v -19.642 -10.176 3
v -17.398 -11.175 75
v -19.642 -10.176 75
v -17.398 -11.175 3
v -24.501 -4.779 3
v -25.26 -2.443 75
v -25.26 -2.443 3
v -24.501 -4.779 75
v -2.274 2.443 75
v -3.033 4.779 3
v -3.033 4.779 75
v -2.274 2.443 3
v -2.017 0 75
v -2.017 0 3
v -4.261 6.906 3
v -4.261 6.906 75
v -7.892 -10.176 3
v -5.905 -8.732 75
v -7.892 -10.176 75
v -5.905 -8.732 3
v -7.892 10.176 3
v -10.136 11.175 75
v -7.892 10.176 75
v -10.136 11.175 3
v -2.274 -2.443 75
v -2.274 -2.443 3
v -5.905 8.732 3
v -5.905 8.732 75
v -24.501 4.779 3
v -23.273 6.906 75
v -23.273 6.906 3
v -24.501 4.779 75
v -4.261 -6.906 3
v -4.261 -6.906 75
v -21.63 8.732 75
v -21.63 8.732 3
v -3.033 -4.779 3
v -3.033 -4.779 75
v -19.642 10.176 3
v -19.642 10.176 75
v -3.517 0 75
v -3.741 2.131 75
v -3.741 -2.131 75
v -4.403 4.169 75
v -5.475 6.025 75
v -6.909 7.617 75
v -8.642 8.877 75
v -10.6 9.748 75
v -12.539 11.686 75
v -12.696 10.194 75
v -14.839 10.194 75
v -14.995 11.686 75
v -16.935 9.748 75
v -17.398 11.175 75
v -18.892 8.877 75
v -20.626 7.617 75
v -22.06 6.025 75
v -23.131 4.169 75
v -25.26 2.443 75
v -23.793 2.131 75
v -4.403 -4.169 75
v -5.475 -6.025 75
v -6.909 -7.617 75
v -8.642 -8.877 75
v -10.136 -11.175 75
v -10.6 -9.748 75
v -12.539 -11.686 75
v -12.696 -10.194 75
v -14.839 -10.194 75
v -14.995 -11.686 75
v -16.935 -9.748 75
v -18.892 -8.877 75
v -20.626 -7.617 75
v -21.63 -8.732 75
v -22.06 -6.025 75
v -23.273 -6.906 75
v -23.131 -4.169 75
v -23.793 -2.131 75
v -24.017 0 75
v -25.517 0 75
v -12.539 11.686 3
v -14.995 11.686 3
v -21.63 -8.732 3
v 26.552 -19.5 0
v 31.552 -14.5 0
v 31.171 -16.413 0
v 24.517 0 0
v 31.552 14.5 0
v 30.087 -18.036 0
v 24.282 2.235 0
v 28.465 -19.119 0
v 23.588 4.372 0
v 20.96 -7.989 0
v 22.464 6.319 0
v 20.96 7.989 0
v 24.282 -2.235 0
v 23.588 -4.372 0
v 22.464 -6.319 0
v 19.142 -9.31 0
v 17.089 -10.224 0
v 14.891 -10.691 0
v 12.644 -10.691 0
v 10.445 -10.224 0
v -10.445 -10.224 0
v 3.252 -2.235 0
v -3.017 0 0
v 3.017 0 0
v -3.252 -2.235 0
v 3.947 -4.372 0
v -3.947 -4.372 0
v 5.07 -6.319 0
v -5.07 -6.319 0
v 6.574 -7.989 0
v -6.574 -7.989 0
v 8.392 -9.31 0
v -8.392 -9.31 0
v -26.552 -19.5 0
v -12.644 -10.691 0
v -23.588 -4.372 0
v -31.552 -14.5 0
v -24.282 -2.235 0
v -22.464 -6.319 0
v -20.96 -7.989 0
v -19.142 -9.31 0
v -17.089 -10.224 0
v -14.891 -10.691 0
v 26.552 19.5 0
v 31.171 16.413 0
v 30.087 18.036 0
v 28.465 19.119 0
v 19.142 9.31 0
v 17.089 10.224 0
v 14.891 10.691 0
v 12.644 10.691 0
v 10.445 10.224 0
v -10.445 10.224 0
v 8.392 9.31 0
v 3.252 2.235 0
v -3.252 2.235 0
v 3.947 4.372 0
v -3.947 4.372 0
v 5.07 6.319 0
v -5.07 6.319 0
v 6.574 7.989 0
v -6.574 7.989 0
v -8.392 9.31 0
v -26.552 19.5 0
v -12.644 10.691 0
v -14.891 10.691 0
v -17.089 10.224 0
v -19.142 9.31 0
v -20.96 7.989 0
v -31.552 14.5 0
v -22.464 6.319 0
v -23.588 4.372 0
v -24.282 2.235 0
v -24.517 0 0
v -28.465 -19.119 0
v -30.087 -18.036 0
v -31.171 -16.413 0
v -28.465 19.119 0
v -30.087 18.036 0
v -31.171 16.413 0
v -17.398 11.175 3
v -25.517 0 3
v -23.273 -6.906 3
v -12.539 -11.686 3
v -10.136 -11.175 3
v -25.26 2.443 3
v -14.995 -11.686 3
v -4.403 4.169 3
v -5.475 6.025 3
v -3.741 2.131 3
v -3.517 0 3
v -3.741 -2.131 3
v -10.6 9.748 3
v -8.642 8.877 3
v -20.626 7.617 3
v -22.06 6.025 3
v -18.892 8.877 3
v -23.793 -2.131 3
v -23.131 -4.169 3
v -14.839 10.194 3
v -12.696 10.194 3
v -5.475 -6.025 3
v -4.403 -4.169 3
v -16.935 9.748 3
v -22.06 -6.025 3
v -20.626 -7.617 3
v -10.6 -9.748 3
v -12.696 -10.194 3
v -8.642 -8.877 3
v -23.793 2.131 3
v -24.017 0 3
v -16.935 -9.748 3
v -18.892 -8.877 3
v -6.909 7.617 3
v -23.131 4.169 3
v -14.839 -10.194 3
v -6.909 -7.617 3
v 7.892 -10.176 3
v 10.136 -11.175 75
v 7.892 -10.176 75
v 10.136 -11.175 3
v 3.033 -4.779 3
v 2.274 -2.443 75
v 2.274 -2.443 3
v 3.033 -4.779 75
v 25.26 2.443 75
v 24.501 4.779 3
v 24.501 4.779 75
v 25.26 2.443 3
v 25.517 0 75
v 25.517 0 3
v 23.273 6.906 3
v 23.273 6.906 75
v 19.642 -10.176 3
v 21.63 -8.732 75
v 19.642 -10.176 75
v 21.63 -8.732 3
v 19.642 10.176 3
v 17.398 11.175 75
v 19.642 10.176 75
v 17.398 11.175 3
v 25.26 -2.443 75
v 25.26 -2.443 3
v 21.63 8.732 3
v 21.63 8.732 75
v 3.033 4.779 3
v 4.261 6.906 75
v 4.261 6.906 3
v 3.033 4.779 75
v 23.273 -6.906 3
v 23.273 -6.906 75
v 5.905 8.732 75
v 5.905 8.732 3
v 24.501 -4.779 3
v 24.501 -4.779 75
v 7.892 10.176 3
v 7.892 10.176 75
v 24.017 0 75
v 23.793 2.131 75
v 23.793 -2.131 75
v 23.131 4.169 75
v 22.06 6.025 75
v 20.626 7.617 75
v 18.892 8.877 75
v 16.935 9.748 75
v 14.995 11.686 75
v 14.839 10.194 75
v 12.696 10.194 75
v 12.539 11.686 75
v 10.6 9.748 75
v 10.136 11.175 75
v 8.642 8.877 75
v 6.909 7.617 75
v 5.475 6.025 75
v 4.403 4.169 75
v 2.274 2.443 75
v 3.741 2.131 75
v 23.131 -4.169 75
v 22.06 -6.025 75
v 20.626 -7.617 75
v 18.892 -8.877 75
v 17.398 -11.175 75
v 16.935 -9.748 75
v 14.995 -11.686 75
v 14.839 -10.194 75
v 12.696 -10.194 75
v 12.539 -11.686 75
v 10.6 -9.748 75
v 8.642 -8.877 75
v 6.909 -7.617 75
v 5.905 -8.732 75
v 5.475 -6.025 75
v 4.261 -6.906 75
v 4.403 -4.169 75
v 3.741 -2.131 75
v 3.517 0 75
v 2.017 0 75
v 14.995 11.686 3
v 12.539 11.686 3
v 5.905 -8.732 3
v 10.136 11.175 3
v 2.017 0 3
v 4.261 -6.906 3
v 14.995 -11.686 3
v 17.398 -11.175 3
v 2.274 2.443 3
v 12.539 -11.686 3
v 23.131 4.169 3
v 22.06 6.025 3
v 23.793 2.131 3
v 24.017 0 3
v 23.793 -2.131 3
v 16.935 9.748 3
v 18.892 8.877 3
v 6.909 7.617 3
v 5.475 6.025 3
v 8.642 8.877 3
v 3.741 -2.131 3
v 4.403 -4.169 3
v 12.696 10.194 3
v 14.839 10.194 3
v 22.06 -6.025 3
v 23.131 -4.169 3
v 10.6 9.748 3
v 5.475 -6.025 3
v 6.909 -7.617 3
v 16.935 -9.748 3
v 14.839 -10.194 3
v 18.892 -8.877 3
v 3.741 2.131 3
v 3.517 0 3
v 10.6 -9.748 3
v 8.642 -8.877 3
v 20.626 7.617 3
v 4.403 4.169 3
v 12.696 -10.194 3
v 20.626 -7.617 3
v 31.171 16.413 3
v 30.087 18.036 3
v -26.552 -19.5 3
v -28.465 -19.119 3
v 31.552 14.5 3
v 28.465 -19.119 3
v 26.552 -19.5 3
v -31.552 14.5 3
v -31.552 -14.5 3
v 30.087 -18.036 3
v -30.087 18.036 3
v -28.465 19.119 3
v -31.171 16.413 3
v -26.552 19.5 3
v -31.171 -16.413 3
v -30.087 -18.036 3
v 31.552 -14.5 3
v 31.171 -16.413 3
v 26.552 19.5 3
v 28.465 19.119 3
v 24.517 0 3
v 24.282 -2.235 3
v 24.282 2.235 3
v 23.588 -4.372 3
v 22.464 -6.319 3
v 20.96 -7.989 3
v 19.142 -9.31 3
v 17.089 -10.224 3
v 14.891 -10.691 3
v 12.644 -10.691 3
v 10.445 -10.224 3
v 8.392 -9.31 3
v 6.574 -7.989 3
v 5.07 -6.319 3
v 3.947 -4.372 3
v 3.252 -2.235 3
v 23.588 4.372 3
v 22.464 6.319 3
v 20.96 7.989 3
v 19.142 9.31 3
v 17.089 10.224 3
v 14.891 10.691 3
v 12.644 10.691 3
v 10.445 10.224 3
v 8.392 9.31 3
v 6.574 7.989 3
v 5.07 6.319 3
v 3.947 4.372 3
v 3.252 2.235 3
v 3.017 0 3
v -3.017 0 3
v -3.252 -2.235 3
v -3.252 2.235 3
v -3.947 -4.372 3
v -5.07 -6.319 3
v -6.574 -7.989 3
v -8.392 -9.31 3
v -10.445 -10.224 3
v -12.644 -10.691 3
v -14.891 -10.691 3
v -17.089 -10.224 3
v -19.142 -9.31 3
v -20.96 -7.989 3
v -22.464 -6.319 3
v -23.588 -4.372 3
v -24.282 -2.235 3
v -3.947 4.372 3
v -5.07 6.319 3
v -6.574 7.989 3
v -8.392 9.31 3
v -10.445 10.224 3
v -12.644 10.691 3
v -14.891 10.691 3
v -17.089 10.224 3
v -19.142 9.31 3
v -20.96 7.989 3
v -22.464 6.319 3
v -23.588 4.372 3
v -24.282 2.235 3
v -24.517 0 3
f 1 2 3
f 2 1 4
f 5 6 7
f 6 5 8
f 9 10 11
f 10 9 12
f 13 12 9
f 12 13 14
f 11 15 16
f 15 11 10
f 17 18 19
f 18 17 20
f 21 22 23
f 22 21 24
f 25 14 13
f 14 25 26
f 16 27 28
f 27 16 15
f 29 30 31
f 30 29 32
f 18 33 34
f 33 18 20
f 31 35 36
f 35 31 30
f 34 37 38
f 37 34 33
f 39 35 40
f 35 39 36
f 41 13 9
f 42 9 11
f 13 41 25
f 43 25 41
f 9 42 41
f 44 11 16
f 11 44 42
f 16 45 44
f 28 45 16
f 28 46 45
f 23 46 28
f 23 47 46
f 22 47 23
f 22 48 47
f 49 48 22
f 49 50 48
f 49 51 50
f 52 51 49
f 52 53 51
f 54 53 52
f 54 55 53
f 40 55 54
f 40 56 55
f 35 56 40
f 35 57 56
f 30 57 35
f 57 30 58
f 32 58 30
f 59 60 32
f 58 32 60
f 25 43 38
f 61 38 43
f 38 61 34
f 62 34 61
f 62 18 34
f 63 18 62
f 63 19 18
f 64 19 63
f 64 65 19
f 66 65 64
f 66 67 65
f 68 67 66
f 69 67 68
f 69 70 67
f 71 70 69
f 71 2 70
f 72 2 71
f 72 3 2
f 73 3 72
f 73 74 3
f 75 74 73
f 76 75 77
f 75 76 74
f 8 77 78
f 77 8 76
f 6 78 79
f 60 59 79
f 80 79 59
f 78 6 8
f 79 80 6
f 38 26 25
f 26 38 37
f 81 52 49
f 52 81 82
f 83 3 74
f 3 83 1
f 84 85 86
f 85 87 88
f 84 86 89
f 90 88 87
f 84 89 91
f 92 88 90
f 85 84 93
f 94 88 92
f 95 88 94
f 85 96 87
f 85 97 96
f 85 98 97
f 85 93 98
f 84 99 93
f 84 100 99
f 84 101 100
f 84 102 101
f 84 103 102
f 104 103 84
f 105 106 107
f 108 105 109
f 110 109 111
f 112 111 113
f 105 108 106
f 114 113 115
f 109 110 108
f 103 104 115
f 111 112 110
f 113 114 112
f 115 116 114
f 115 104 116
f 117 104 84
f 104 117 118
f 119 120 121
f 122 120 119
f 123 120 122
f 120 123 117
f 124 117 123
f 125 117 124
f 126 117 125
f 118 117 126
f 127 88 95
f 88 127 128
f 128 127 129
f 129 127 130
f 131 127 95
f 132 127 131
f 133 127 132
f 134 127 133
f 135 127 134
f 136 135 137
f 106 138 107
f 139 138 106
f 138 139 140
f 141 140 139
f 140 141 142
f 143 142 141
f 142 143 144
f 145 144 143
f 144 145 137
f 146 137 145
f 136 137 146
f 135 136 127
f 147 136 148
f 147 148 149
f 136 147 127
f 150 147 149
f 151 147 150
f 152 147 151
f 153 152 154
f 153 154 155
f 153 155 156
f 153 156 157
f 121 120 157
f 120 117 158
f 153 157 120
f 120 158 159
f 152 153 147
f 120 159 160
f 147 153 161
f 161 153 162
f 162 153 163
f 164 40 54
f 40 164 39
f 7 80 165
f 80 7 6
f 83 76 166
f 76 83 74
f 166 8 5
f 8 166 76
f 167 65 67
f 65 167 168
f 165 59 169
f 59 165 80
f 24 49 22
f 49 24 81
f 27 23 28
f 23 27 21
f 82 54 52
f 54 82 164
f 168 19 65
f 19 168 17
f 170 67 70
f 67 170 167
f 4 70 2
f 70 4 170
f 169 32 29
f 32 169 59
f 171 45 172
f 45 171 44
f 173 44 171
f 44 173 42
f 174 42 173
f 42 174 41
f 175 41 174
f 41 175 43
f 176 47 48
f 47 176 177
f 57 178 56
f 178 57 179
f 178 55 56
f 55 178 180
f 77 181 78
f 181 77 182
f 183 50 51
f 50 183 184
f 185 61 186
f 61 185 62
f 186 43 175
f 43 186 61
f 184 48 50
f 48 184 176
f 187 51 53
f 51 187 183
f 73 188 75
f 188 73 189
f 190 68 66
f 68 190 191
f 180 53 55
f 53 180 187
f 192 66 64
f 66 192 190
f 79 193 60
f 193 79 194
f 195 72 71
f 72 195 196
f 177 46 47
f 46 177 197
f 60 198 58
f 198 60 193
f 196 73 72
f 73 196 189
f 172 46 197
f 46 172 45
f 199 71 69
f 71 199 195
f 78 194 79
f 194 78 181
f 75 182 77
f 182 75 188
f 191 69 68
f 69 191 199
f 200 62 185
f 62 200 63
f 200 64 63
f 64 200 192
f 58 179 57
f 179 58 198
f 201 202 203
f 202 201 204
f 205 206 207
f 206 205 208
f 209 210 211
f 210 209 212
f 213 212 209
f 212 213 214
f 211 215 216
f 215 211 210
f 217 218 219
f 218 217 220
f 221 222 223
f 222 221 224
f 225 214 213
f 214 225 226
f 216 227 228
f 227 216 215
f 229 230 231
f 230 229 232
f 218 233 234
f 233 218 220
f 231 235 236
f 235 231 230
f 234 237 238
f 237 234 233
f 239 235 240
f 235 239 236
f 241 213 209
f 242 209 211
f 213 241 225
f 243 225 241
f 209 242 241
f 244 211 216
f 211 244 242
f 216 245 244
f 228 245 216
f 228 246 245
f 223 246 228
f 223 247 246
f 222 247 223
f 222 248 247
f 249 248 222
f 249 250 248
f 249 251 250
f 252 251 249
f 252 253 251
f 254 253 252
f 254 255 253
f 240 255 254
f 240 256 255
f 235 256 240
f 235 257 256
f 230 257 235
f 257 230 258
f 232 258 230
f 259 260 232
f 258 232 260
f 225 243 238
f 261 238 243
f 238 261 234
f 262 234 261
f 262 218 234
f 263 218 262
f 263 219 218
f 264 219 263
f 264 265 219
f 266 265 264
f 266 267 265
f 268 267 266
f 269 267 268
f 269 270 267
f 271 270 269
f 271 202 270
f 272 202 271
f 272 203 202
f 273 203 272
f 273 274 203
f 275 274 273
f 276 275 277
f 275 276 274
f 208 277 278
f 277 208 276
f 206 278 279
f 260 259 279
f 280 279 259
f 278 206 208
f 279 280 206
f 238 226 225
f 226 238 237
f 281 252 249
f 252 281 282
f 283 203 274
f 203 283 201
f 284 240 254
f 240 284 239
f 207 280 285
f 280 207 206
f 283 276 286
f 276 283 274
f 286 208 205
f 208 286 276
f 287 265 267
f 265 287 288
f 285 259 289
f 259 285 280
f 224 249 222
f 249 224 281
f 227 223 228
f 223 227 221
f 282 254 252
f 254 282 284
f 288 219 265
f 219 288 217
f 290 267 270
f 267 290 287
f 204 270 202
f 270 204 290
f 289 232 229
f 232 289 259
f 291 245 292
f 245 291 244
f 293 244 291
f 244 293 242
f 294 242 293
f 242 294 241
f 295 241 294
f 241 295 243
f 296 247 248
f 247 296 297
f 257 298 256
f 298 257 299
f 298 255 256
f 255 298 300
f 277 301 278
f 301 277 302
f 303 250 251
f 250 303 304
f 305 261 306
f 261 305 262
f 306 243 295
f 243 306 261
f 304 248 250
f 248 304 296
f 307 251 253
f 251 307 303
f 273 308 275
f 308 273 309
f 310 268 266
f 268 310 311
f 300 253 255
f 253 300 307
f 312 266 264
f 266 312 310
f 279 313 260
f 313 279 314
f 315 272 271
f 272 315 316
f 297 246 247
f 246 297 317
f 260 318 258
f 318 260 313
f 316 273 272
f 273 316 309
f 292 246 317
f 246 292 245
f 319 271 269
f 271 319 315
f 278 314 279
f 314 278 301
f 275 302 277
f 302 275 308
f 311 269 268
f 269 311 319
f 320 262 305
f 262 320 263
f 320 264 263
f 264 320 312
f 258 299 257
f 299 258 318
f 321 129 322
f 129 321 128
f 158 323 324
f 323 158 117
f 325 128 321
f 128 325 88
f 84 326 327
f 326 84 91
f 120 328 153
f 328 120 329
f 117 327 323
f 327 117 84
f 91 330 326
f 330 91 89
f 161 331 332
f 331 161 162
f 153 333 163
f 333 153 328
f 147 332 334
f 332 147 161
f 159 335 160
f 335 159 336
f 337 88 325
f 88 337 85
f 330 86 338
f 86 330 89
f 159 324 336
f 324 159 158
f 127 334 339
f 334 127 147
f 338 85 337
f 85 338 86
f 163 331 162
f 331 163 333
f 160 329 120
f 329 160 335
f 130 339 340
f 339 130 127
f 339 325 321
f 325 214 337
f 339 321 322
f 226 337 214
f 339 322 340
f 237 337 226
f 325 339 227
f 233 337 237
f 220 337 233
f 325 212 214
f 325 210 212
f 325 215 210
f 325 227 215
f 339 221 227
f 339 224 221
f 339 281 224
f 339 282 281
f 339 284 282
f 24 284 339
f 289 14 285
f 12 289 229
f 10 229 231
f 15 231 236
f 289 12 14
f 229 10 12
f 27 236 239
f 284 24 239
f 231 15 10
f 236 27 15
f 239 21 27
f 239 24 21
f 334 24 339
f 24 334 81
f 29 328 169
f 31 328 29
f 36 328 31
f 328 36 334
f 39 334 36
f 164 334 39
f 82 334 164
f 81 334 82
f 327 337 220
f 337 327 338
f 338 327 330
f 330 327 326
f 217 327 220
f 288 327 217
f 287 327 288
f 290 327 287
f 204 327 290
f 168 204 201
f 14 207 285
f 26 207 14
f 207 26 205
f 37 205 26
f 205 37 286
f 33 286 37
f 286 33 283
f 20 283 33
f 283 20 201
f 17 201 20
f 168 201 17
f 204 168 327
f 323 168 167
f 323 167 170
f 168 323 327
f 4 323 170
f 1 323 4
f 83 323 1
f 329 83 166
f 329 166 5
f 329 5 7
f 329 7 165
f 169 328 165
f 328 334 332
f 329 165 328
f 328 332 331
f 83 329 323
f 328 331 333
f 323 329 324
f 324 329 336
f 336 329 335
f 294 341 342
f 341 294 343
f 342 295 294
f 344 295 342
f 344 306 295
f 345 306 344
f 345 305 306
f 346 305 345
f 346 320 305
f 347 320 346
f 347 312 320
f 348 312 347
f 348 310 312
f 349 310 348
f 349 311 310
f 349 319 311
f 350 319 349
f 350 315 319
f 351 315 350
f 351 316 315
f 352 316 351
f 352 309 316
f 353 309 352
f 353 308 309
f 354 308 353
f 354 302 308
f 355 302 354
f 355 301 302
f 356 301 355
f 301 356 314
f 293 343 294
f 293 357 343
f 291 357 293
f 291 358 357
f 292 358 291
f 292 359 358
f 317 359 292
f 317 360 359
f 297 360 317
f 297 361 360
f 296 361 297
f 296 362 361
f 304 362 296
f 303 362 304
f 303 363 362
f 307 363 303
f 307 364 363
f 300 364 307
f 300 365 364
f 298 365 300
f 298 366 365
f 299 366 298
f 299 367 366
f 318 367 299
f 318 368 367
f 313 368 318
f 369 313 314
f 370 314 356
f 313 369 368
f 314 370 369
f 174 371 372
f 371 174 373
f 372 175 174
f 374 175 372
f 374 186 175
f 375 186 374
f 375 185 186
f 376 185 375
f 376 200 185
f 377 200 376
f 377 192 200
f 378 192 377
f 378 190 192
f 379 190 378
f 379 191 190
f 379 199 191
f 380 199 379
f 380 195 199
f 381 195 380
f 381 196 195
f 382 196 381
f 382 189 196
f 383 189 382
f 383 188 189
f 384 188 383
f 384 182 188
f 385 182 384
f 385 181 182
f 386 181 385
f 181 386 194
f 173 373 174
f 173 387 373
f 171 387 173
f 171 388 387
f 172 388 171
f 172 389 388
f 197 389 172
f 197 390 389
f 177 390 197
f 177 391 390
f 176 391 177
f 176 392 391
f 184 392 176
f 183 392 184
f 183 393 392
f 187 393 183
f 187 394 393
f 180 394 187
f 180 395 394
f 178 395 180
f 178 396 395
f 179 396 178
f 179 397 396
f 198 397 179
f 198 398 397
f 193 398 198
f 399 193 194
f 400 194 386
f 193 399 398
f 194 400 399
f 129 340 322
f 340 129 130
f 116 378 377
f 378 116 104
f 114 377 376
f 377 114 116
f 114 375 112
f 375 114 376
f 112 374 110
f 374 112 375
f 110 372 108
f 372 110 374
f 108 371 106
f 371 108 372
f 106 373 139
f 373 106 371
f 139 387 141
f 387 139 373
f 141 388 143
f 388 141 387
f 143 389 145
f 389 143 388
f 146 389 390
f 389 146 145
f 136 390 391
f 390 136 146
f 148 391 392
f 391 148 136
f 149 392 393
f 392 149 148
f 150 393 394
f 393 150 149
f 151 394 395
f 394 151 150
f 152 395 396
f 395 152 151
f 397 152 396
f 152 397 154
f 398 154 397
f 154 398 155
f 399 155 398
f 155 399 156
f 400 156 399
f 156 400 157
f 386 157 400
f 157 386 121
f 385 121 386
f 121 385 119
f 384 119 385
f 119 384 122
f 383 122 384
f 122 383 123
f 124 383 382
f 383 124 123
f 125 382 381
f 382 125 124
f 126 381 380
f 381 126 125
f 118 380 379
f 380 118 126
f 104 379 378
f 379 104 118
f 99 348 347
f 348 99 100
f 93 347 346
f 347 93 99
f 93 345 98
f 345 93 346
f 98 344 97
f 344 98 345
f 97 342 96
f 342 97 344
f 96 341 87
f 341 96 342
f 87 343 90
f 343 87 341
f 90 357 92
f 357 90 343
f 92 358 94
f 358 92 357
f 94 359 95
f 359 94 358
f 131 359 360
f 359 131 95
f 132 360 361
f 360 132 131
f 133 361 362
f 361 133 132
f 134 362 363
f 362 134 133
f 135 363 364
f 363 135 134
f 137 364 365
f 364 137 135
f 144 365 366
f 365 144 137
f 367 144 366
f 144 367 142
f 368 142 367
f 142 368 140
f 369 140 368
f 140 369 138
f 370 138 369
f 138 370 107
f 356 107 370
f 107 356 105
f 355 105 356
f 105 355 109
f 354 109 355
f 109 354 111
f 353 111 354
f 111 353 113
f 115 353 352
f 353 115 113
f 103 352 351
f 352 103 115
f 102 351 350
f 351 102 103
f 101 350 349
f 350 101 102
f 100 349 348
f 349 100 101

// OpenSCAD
// panel for running zmt through the wall
// this one is longer than morapanel.scad, and has slightly
// wider tubes so that the other panel can lock in.
// overall width and height remain the same, and the tubes
// are centered at the same points. tubes are 3/4 of wall depth.

PHI = 1.61803398874;

wall = 150;  // thickness of transfixed wall
zmt = 19.5; // three-fourths of an inch diameter == 19.05, we leave 0.45
x = zmt * 2 / PHI; // amount of free space in width
w = 2 * zmt + x;
h = w / PHI;

centx = (x / 6) + (zmt / 2);

module rounded(width, height, radius_corner){
	translate([radius_corner, radius_corner, 0])
		minkowski() {
			square([width - 2 * radius_corner, height - 2 * radius_corner]);
			circle(radius_corner);
		}
}

// combined thickness of walls around tubes
cthick = 4;
// thickness of plugin component's walls, cgap < cthick
cgap = 1;

module tube(){
	difference(){
		cylinder(wall / 2, (zmt + cthick) / 2, (zmt + cthick) / 2);
		cylinder(wall / 2, (zmt + cgap) / 2, (zmt + cgap) / 2);
	}
}

difference(){
	union(){
		linear_extrude(3){
			translate([-w / 2, -h / 2, 0]){
				rounded(w, h, 5);
			}
		}
		translate([-centx, 0, 0]){
			tube();
		}
		translate([centx, 0, 0]){
			tube();
		}
	}
	linear_extrude(3){
		translate([-centx, 0, 0]){
			circle(zmt / 2 + 1);
		}
		translate([centx, 0, 0]){
			circle(zmt / 2 + 1);
		}
	}
}
